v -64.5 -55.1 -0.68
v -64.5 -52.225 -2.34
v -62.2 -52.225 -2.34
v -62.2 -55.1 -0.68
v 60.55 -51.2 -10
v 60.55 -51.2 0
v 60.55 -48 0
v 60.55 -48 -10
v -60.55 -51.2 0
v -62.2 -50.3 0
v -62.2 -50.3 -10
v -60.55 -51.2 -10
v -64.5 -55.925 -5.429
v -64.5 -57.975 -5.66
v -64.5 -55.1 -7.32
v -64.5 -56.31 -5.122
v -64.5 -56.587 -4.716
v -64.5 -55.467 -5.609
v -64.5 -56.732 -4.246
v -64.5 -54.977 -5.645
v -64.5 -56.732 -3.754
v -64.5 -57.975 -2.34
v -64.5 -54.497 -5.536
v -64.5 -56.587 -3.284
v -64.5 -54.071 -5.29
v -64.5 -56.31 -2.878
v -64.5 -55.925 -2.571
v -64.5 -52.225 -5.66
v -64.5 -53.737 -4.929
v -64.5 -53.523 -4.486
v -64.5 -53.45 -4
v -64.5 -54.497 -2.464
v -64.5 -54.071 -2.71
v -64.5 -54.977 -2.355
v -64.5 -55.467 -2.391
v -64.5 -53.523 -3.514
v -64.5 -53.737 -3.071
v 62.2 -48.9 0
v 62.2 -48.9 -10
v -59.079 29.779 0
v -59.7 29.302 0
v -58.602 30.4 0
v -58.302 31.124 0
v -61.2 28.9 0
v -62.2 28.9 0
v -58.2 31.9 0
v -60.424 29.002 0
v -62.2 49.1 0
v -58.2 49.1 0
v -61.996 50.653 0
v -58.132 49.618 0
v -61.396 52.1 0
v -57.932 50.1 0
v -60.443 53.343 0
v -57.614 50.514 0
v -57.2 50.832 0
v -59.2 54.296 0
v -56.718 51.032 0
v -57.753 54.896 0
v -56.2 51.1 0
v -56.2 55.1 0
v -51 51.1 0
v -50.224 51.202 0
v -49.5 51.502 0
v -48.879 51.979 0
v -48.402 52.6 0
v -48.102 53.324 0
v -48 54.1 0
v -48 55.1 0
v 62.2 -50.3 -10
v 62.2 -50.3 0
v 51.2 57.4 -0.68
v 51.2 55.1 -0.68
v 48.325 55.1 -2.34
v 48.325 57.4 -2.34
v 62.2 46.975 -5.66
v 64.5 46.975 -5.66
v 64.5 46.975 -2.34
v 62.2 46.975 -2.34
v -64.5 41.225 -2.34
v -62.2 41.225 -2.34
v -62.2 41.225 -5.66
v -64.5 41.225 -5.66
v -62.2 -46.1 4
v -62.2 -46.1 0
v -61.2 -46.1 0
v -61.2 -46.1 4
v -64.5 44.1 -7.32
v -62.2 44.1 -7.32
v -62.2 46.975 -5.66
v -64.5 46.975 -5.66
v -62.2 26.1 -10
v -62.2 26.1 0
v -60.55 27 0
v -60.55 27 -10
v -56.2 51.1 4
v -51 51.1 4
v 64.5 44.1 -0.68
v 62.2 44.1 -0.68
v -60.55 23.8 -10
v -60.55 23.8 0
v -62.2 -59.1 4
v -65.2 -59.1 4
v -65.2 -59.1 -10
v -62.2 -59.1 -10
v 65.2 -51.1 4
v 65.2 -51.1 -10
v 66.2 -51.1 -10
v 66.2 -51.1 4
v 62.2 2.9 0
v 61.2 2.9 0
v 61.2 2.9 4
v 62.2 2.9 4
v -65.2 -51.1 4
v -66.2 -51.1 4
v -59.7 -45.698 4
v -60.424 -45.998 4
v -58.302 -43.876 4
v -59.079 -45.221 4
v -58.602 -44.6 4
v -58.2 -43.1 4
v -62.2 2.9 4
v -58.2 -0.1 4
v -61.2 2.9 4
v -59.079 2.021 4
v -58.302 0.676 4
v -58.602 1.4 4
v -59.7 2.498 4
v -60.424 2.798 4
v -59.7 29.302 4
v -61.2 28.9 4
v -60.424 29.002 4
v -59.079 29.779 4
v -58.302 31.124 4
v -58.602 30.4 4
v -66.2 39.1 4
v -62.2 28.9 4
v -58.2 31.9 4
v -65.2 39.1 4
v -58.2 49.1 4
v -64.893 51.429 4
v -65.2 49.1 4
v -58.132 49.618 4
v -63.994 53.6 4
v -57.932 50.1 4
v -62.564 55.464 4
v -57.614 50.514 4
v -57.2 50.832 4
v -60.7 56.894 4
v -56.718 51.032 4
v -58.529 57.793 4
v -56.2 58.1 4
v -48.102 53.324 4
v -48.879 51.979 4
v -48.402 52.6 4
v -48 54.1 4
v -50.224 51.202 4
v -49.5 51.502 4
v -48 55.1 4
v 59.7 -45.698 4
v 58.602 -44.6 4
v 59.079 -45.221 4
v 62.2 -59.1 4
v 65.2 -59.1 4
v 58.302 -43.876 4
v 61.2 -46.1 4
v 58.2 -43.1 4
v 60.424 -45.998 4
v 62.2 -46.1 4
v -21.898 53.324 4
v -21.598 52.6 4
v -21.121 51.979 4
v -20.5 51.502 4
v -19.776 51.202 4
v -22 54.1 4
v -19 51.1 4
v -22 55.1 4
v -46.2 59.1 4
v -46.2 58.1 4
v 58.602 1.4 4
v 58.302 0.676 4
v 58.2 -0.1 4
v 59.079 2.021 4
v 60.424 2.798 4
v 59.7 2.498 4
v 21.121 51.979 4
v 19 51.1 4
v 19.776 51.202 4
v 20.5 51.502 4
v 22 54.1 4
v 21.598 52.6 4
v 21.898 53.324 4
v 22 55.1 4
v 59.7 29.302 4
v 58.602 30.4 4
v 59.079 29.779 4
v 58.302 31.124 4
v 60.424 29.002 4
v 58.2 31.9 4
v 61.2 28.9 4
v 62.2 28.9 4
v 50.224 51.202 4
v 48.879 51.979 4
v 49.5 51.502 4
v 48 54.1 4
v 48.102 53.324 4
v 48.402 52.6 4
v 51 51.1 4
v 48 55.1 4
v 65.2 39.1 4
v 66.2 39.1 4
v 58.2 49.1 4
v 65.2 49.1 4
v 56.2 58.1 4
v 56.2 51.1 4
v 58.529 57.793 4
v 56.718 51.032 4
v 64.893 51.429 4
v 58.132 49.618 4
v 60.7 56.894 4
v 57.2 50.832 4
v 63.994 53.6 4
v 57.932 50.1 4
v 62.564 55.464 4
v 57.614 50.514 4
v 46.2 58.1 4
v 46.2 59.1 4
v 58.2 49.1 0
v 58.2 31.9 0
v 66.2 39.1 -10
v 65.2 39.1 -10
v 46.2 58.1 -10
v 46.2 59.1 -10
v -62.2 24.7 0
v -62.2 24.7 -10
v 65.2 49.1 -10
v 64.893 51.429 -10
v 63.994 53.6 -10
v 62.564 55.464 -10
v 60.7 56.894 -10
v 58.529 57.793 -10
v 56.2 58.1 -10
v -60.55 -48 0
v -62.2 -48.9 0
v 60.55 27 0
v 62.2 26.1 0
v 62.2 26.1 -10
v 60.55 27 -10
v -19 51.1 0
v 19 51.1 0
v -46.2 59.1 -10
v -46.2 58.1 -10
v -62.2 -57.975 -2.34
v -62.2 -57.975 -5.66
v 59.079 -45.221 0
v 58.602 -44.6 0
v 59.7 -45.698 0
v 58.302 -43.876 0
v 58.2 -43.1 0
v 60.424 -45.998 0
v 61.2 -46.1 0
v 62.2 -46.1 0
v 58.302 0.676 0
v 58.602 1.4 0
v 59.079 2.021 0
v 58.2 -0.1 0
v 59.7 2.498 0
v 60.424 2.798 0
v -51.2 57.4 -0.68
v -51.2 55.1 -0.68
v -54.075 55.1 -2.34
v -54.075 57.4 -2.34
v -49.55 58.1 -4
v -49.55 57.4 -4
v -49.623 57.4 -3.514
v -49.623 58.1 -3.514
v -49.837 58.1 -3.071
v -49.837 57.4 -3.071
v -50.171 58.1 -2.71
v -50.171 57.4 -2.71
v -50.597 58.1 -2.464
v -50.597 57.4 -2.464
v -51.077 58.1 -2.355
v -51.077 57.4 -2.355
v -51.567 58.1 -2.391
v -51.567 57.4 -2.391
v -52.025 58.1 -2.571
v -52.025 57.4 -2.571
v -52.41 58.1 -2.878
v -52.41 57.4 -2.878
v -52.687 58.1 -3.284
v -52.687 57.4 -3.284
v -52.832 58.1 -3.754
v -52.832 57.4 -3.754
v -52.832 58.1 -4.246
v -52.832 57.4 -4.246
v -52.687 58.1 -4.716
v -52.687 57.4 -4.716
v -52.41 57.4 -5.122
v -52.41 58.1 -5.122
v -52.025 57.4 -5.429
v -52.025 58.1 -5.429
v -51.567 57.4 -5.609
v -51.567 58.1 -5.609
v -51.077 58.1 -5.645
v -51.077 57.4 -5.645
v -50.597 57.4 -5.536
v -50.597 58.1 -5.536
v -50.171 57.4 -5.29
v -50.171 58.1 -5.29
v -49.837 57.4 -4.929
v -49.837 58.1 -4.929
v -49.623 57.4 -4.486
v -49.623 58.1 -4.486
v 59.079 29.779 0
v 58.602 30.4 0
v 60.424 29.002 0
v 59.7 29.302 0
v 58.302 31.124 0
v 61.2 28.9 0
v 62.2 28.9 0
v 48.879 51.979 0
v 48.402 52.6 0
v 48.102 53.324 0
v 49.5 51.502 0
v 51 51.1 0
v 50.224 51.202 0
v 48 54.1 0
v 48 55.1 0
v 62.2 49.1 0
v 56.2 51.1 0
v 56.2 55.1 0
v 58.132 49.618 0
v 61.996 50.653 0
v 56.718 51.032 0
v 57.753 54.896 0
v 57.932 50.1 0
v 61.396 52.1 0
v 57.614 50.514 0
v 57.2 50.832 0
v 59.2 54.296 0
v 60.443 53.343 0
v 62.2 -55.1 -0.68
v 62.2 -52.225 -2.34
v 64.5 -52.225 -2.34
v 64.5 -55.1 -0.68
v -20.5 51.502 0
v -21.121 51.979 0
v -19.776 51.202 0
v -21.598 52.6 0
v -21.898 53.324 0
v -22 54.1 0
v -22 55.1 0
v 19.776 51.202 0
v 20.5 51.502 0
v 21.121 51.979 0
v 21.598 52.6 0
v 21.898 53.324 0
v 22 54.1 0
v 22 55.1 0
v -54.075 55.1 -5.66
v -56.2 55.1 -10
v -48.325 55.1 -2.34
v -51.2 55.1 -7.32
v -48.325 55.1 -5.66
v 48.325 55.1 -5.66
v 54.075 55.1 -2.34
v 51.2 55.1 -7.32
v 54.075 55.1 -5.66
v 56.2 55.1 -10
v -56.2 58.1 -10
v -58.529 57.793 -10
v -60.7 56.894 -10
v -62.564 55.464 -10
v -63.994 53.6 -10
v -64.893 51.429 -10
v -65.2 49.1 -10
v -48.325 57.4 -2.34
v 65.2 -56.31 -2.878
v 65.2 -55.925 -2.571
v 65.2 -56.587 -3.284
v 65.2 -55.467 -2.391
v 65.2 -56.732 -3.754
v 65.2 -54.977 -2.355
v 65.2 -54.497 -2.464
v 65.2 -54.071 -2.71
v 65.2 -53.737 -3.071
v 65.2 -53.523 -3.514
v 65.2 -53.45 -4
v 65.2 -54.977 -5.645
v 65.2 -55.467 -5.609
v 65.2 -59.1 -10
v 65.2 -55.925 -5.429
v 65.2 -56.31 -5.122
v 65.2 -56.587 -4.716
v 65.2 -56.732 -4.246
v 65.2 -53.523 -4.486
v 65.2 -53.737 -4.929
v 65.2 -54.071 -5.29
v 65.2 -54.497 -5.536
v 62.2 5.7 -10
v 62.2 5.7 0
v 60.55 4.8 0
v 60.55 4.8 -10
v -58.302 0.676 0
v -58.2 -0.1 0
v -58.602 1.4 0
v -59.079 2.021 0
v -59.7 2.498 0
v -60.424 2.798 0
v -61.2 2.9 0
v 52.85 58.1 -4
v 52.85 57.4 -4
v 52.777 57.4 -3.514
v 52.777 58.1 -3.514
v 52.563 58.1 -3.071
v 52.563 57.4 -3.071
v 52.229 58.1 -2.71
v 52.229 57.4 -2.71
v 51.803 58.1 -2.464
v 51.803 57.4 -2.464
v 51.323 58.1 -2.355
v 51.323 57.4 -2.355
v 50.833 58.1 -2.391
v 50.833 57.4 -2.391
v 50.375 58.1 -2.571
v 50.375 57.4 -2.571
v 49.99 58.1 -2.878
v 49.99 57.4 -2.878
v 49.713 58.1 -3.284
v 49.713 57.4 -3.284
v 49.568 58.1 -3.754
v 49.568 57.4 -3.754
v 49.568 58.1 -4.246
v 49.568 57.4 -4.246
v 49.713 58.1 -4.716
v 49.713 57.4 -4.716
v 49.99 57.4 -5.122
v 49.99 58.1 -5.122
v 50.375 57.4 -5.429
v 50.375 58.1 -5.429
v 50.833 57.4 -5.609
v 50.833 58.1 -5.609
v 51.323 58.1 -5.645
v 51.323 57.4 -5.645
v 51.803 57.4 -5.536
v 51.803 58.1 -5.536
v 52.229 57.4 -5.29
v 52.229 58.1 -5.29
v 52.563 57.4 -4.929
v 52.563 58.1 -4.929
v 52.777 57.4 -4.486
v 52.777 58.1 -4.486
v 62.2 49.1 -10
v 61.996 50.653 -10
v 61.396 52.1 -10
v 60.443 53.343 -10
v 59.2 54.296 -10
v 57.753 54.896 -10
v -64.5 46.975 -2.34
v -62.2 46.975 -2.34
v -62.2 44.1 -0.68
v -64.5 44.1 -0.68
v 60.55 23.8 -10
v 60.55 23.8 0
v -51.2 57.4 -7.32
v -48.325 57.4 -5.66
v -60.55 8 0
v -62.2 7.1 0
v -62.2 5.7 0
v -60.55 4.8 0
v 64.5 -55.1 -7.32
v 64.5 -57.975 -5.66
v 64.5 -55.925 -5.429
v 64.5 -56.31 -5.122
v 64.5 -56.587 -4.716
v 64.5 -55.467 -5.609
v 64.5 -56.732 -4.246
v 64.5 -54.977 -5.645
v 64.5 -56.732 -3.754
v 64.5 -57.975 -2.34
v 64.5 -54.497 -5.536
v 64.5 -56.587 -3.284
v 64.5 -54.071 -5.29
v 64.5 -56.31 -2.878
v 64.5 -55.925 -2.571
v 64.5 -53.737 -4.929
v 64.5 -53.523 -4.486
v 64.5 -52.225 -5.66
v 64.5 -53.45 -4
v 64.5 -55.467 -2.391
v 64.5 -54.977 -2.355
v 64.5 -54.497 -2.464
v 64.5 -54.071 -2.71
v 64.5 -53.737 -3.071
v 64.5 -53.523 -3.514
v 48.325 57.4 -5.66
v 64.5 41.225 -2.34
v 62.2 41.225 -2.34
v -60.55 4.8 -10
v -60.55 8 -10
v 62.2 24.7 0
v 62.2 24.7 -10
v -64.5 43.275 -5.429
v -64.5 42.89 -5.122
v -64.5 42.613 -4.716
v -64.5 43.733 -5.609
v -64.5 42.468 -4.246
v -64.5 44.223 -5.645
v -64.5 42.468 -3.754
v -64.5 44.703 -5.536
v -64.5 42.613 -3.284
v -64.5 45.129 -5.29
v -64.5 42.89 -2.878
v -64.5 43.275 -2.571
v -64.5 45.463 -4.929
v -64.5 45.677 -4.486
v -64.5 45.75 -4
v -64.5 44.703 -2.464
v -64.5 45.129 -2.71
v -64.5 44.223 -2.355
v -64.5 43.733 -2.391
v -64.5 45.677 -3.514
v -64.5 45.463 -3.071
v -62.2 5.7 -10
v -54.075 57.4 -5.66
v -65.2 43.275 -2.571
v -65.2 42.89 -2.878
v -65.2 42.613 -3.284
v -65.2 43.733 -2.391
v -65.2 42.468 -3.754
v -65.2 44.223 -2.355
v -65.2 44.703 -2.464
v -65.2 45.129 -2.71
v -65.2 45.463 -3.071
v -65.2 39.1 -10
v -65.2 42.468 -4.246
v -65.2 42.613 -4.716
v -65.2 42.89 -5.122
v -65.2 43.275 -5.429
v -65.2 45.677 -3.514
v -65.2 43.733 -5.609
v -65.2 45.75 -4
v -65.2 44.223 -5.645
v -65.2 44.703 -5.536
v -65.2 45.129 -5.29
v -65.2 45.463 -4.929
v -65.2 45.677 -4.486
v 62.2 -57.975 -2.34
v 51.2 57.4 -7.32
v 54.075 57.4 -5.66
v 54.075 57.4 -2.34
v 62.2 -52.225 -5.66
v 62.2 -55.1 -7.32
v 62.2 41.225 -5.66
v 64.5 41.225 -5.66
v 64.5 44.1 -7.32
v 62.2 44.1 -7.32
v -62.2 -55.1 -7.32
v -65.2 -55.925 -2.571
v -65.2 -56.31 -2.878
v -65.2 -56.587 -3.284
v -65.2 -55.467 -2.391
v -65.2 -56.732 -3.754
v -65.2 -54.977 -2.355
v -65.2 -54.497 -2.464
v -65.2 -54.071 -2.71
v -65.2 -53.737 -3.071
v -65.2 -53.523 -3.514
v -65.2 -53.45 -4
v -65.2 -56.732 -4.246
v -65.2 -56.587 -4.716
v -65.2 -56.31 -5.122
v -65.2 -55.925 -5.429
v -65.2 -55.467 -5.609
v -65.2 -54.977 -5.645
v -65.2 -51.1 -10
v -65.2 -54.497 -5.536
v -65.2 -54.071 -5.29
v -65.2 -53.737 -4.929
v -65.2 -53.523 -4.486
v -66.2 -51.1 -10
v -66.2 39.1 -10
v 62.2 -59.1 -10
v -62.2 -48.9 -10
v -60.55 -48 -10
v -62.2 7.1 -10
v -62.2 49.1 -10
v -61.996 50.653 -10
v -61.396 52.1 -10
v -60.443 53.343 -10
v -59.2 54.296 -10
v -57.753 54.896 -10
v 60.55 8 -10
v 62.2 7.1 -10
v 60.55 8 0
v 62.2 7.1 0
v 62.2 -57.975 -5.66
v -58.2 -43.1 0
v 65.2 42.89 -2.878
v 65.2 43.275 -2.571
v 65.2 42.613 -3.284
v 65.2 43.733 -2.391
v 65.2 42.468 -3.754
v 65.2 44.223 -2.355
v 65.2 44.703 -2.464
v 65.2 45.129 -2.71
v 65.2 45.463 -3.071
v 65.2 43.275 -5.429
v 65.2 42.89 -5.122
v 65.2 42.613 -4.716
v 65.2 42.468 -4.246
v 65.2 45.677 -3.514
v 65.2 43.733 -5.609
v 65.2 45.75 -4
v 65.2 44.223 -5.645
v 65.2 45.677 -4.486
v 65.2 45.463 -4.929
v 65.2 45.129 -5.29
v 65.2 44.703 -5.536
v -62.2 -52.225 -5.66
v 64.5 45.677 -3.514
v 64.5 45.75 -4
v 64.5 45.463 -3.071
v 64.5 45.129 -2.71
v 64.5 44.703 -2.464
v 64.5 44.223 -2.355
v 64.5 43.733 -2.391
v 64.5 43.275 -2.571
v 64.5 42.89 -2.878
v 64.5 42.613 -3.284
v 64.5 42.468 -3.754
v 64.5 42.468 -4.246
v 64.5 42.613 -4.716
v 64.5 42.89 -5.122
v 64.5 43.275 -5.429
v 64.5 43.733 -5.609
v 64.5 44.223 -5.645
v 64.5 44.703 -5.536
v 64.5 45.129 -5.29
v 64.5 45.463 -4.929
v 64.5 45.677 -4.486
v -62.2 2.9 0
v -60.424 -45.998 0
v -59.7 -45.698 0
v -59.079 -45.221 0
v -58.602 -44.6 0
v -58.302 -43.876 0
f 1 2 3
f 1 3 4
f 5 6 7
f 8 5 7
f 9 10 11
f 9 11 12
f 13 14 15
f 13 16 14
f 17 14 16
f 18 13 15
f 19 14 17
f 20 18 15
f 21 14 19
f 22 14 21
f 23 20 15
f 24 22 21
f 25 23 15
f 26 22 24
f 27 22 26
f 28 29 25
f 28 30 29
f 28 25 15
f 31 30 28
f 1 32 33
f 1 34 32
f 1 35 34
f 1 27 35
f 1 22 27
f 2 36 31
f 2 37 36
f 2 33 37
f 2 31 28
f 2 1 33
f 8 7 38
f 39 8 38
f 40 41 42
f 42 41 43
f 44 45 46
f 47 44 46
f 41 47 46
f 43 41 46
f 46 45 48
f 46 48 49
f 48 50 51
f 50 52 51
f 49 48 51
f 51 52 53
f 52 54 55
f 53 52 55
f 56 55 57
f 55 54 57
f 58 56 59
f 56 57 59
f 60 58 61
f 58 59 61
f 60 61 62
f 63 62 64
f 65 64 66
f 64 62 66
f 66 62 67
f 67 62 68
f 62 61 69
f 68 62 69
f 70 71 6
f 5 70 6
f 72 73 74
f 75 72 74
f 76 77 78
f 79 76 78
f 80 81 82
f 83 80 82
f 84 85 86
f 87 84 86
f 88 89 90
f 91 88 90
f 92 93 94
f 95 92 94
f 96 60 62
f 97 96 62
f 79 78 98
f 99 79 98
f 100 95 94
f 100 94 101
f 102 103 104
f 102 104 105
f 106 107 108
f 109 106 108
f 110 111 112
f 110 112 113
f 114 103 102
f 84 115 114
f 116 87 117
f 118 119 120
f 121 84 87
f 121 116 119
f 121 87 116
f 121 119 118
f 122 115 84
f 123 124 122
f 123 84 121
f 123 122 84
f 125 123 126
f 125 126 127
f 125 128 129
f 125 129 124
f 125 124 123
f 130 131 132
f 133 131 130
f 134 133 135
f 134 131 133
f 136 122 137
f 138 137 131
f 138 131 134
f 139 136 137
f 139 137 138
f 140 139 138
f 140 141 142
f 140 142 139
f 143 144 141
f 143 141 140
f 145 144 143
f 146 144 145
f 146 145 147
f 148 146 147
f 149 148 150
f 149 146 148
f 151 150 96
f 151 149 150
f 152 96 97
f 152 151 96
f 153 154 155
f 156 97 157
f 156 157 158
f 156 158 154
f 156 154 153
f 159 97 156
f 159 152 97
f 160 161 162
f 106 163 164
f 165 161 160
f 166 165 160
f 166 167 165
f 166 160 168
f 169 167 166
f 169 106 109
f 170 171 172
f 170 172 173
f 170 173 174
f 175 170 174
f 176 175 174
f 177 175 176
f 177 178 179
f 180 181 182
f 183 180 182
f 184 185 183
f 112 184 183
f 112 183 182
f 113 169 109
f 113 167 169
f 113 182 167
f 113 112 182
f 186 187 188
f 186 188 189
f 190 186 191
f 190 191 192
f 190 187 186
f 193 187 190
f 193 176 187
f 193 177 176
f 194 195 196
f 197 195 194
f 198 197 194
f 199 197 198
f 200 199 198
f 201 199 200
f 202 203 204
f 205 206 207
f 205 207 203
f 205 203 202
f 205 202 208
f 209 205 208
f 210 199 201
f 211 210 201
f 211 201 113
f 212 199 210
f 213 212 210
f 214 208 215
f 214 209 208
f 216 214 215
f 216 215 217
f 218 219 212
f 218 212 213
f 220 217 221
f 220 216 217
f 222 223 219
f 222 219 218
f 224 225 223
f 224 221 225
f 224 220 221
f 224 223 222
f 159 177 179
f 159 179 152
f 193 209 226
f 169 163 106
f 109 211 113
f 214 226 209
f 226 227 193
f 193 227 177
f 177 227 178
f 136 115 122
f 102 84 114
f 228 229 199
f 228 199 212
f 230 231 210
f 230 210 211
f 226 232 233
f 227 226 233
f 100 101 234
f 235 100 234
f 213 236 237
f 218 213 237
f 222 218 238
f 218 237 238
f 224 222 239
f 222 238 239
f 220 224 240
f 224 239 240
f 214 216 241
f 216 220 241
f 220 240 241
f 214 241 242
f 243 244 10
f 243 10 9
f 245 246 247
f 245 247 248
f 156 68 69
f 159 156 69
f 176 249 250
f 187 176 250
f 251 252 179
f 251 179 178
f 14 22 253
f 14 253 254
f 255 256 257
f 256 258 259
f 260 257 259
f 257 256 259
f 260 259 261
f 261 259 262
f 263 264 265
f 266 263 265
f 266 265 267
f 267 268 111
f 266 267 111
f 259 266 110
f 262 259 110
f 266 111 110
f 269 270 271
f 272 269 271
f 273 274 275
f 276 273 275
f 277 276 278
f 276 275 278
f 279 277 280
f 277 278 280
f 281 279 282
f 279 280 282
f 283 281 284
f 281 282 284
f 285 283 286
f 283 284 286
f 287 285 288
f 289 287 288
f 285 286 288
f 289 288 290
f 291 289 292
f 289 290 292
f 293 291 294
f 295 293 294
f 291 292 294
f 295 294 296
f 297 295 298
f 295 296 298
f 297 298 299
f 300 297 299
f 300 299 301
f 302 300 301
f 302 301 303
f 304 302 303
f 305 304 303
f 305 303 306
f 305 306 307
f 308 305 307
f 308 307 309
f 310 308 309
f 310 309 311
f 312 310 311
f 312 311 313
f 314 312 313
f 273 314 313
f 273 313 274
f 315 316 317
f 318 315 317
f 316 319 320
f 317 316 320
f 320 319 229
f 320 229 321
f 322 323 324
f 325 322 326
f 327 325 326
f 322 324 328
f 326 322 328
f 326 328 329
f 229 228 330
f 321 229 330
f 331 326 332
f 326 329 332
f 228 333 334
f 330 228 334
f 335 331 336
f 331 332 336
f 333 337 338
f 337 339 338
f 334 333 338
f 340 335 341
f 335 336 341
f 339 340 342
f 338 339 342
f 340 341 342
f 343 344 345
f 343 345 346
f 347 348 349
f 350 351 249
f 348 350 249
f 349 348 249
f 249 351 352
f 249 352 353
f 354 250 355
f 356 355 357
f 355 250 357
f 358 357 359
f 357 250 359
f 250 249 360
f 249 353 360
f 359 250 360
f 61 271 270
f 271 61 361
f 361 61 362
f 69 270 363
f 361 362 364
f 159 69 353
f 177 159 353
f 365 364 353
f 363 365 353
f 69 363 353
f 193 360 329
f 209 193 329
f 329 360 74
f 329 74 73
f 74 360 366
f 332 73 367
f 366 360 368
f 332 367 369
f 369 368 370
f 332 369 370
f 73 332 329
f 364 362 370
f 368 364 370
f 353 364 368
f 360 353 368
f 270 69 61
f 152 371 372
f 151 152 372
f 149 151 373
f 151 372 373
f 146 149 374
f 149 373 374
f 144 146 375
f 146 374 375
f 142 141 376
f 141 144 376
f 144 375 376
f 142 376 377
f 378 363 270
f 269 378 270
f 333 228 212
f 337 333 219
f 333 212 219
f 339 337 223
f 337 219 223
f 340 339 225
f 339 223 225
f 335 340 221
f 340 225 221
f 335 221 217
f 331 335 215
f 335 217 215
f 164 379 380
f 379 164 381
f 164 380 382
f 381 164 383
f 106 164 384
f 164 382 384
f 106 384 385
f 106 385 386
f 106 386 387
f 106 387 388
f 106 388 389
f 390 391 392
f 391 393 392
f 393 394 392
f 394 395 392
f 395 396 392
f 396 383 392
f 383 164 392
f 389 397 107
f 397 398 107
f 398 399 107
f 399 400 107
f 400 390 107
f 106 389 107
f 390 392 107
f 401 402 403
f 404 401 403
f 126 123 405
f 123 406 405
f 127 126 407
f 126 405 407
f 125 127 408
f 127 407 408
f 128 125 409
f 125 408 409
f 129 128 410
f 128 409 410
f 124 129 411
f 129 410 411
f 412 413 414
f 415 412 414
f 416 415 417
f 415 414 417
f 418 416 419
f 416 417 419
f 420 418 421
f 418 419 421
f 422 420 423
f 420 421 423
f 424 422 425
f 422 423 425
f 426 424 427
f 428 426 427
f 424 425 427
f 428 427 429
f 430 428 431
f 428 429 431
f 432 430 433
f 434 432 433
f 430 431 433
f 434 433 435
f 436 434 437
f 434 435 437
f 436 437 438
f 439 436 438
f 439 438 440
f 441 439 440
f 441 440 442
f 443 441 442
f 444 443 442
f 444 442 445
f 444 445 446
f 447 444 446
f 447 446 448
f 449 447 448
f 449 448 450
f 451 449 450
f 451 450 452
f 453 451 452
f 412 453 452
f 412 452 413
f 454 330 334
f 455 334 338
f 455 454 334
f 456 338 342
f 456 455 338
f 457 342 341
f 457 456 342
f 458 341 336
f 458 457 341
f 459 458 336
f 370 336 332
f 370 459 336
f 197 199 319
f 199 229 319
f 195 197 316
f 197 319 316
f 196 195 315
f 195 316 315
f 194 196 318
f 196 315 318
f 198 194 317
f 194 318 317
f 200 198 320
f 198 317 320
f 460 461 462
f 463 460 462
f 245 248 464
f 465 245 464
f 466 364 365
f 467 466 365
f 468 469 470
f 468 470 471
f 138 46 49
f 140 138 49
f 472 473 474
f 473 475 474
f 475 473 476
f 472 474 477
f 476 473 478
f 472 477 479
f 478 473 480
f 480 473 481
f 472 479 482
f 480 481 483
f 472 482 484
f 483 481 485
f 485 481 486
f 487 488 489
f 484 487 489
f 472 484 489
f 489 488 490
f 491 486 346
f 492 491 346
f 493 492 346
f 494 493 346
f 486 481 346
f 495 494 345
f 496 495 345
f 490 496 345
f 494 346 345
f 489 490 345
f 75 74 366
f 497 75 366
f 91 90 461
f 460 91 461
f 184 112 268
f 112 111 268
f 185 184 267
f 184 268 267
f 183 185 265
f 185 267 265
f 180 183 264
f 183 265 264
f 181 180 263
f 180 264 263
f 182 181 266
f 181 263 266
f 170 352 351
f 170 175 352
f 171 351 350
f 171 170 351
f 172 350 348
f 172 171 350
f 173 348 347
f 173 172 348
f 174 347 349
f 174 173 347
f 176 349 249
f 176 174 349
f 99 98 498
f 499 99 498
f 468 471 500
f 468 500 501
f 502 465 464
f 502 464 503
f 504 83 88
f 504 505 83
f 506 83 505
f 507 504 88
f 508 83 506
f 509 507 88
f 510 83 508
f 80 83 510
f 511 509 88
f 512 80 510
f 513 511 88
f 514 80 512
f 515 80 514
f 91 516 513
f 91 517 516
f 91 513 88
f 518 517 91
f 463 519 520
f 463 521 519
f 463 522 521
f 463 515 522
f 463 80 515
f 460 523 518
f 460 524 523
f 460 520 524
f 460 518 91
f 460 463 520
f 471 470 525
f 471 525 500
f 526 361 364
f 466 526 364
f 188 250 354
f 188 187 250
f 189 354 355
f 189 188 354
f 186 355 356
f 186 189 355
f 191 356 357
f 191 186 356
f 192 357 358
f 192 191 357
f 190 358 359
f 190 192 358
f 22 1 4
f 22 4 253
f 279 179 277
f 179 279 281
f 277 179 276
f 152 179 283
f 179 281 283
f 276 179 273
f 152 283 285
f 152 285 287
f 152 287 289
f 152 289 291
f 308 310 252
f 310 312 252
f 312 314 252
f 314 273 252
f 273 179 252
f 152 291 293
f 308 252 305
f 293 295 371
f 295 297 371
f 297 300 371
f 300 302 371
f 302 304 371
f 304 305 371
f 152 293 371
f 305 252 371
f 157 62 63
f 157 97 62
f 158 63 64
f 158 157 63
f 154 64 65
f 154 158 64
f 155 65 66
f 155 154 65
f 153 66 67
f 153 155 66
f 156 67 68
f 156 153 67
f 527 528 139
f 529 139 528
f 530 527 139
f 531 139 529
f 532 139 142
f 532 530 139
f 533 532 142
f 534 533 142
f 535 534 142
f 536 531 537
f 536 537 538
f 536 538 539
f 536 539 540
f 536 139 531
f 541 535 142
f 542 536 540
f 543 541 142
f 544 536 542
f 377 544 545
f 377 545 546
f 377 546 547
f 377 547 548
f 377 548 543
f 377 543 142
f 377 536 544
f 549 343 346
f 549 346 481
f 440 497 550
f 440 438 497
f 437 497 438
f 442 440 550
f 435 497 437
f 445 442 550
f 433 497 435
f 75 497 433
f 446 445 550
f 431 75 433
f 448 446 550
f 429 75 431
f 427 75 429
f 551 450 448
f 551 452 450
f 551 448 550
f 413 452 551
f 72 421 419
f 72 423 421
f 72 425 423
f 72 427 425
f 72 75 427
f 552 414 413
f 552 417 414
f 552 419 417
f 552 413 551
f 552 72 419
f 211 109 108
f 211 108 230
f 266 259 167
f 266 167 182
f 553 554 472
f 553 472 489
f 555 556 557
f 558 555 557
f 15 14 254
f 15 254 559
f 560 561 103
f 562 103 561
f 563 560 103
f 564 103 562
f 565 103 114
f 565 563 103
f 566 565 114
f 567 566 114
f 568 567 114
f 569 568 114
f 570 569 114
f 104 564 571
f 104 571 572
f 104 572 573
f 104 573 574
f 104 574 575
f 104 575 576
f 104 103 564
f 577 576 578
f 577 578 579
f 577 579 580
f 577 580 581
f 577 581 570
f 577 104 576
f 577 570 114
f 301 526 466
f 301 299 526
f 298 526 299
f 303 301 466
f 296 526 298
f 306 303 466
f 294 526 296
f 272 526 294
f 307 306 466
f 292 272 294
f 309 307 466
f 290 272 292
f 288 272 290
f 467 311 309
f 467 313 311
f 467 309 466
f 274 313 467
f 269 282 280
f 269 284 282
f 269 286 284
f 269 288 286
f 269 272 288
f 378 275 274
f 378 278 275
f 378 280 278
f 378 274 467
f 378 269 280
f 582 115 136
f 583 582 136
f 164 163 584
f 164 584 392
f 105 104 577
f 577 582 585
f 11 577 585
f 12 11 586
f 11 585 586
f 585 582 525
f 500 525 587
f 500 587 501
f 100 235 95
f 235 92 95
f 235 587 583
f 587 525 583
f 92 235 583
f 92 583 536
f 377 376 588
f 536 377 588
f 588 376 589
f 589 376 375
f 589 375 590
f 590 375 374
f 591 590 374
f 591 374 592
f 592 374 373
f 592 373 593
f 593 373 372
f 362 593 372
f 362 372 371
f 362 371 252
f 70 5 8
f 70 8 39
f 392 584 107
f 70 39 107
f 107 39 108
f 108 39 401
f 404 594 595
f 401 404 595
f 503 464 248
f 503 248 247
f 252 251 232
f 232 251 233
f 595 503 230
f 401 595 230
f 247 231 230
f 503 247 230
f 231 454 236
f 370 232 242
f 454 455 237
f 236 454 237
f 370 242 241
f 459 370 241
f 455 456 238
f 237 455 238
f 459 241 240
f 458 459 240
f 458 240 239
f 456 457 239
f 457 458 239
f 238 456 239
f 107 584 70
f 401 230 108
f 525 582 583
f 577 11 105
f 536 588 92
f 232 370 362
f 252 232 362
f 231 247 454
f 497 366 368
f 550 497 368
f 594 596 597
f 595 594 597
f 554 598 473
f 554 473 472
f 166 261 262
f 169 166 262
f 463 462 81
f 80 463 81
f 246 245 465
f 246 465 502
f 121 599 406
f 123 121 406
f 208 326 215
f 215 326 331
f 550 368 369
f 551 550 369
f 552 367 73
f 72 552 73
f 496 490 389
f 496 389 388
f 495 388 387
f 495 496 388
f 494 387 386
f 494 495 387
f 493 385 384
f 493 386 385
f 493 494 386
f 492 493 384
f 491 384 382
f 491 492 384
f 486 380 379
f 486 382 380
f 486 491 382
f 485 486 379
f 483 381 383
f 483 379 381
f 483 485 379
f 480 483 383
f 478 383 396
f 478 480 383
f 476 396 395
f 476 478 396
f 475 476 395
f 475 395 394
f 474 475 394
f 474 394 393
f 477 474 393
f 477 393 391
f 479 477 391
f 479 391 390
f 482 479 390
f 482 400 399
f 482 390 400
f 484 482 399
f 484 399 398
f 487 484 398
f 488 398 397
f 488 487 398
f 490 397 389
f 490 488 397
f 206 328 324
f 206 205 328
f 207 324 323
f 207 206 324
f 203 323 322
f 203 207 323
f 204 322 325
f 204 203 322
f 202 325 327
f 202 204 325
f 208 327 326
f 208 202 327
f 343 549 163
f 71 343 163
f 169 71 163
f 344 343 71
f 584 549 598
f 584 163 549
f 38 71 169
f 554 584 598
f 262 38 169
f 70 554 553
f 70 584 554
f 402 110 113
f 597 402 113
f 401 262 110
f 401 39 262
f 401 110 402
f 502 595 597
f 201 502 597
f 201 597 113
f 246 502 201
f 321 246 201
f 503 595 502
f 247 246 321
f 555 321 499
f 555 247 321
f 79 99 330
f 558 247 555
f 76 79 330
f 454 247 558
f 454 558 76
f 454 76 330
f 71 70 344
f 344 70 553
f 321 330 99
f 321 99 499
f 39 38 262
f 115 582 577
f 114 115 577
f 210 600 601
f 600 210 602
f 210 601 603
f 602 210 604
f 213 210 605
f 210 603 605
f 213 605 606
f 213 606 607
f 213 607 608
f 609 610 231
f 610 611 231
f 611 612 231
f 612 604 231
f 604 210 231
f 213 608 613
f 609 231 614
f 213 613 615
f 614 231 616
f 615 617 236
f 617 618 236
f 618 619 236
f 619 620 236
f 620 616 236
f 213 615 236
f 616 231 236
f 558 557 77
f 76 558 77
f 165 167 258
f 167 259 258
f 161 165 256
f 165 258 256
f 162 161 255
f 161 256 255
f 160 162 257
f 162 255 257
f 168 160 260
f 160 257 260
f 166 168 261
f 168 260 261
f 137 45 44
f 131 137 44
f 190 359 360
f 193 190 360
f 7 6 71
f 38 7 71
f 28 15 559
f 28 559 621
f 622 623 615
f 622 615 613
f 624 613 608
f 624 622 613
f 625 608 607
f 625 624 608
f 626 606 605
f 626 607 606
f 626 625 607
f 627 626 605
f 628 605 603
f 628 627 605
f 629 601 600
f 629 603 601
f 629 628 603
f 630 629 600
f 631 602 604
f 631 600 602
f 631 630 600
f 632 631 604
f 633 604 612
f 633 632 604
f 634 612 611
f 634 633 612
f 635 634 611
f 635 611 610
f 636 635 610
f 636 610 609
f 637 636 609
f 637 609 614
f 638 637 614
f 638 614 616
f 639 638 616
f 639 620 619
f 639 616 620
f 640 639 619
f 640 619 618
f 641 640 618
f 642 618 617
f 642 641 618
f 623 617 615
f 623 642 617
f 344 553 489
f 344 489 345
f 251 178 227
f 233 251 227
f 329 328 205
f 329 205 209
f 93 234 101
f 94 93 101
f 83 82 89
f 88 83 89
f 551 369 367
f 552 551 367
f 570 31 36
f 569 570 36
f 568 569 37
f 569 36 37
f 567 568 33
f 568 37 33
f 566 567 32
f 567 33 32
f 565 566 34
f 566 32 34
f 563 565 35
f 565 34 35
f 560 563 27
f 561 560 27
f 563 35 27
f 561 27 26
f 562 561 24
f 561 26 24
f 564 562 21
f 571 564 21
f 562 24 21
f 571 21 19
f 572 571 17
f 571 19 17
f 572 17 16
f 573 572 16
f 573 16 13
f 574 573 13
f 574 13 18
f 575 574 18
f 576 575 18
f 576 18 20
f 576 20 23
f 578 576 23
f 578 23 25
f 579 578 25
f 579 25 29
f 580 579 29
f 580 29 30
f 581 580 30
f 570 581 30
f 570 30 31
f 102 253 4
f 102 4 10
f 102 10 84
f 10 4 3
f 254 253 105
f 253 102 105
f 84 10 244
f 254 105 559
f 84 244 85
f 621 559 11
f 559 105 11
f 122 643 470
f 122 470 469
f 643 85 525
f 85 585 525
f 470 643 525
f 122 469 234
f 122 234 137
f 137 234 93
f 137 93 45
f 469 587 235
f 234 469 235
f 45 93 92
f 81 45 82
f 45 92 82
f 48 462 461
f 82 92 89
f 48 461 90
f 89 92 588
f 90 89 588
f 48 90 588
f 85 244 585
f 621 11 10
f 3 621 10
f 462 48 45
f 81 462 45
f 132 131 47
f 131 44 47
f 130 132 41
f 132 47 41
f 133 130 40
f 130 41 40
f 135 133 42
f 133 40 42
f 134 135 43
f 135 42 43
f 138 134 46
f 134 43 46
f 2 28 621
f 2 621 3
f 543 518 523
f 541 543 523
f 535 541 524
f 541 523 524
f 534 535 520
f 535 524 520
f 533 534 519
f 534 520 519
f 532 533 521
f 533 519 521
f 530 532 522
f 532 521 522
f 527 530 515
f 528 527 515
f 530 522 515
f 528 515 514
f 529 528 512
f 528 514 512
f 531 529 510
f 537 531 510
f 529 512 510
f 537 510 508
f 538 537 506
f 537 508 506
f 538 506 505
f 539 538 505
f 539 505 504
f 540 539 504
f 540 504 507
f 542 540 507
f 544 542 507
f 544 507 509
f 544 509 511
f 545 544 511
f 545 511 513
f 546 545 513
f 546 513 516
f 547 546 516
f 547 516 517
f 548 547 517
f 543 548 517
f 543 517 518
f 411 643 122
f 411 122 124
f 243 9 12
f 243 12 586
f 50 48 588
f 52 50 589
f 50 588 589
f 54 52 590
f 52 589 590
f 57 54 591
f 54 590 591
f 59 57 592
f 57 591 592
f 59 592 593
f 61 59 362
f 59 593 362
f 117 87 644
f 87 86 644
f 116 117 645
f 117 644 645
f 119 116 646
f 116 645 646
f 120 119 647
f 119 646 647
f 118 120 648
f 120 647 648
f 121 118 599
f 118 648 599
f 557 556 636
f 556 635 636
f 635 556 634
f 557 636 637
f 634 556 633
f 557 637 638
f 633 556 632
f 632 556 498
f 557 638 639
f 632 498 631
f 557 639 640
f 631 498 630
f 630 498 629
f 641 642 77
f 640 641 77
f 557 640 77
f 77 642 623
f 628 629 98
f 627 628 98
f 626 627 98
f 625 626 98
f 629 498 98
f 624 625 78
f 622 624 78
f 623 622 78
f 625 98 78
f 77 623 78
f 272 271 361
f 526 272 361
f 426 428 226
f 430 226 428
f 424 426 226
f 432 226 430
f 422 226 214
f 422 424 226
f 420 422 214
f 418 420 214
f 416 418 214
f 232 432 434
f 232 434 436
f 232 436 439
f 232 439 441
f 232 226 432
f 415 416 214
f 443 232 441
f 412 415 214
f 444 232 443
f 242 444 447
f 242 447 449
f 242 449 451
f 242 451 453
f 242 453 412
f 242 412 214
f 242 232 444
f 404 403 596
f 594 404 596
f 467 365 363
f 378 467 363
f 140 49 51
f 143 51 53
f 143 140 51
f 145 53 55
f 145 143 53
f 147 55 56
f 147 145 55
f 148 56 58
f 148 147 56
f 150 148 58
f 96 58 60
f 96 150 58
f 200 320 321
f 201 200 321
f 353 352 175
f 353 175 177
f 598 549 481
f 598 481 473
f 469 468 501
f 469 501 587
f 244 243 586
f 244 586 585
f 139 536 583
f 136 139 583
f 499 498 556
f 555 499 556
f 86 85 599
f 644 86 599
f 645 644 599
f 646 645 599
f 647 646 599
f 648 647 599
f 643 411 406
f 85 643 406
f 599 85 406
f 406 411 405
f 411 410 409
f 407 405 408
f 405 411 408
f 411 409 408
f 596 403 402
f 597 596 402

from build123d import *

# Parameters (mm, degrees)
SKETCH_W             = 132.4
SKETCH_H             = 118.2
PAD_DEPTH            = 4
PAD_DEPTH_BACK       = 10
SKETCH001_W          = 124.4
SKETCH001_H          = 114.2
POCKET_DEPTH         = 10.001
SKETCH002_W          = 116.4
SKETCH002_H          = 110.2
POCKET001_DEPTH      = 5
FILLET_R             = 6
FILLET001_R          = 10
FILLET002_R          = 2
POCKET002_DEPTH      = 10.001
POCKET002_DEPTH_BACK = 4.001
PAD001_DEPTH         = 10
SKETCH005_W          = 1
SKETCH005_H          = 8
POCKET003_DEPTH      = 10.001
POCKET003_DEPTH_BACK = 4.001
SKETCH006_R          = 1.65
POCKET004_DEPTH      = 66.201
POCKET004_DEPTH_BACK = 66.201
POCKET005_DEPTH      = 64.5
SKETCH008_R          = 1.65
POCKET006_DEPTH      = 59.101
POCKET006_DEPTH_BACK = 59.101
POCKET007_DEPTH      = 57.4
SKETCH010_W          = 124.4
SKETCH010_H          = 13
SKETCH010_H_2        = 26
SKETCH010_W_2        = 26
SKETCH010_H_3        = 4
POCKET008_DEPTH      = 4.001
FILLET003_R          = 3


with BuildPart() as part:
    # Sketch → Pad (new body, two sides)
    with BuildSketch(Plane.XY) as pad_sk:
        Rectangle(SKETCH_W, SKETCH_H)
    extrude(amount=PAD_DEPTH)
    extrude(pad_sk.sketch, amount=-PAD_DEPTH_BACK)

    # Sketch001 → Pocket (cut, through all)
    with BuildSketch(Plane.XY):
        with Locations((0, -2)):
            Rectangle(SKETCH001_W, SKETCH001_H)
    extrude(amount=-POCKET_DEPTH, mode=Mode.SUBTRACT)

    # Sketch002 → Pocket001 (cut)
    with BuildSketch(Plane.XY):
        with Locations((0, -4)):
            Rectangle(SKETCH002_W, SKETCH002_H)
    extrude(amount=POCKET001_DEPTH, mode=Mode.SUBTRACT)

    # Fillet
    fillet_edges = [part.edges().sort_by_distance(p)[0] for p in [
        (-62.2, 55.1, -5),
        (62.2, 55.1, -5),
    ]]
    fillet(fillet_edges, radius=FILLET_R)

    # Fillet001
    fillet001_edges = [part.edges().sort_by_distance(p)[0] for p in [
        (-66.2, 59.1, -3),
        (66.2, 59.1, -3),
    ]]
    fillet(fillet001_edges, radius=FILLET001_R)

    # Fillet002
    fillet002_edges = [part.edges().sort_by_distance(p)[0] for p in [
        (-58.2, 51.1, 2),
        (58.2, 51.1, 2),
    ]]
    fillet(fillet002_edges, radius=FILLET002_R)

    # Sketch003 → Pocket002 (cut, two sides)
    with BuildSketch(Plane.XY) as pocket002_sk:
        with BuildLine():
            Line((-65.2, 39.1), (-65.2, 49.1))
            ThreePointArc((-56.2, 58.1), (-62.563961, 55.463961), (-65.2, 49.1))
            Line((-46.2, 58.1), (-56.2, 58.1))
            Line((-46.2, 58.1), (-46.2, 59.1))
            Line((-46.2, 59.1), (-56.2, 59.1))
            ThreePointArc((-56.2, 59.1), (-63.271068, 56.171068), (-66.2, 49.1))
            Line((-66.2, 39.1), (-66.2, 49.1))
            Line((-65.2, 39.1), (-66.2, 39.1))
        make_face()
        with BuildLine():
            Line((65.2, 39.1), (65.2, 49.1))
            ThreePointArc((65.2, 49.1), (62.563961, 55.463961), (56.2, 58.1))
            Line((46.2, 58.1), (56.2, 58.1))
            Line((46.2, 58.1), (46.2, 59.1))
            Line((46.2, 59.1), (56.2, 59.1))
            ThreePointArc((66.2, 49.1), (63.271068, 56.171068), (56.2, 59.1))
            Line((66.2, 39.1), (66.2, 49.1))
            Line((65.2, 39.1), (66.2, 39.1))
        make_face()
    extrude(amount=-POCKET002_DEPTH, mode=Mode.SUBTRACT)
    extrude(pocket002_sk.sketch, amount=POCKET002_DEPTH_BACK, mode=Mode.SUBTRACT)

    # Sketch004 → Pad001 (join)
    with BuildSketch(Plane.XY):
        Polygon((-62.2, 24.7), (-62.2, 26.1), (-60.55, 27), (-60.55, 23.8), align=None)
        Polygon((-62.2, 5.7), (-60.55, 4.8), (-60.55, 8), (-62.2, 7.1), align=None)
        Polygon((-62.2, -50.3), (-60.55, -51.2), (-60.55, -48), (-62.2, -48.9), align=None)
        Polygon((62.2, 24.7), (62.2, 26.1), (60.55, 27), (60.55, 23.8), align=None)
        Polygon((62.2, 5.7), (60.55, 4.8), (60.55, 8), (62.2, 7.1), align=None)
        Polygon((62.2, -50.3), (60.55, -51.2), (60.55, -48), (62.2, -48.9), align=None)
    extrude(amount=-PAD001_DEPTH)

    # Sketch005 → Pocket003 (cut, two sides)
    with BuildSketch(Plane.XY) as pocket003_sk:
        with Locations((-65.7, -55.1)):
            Rectangle(SKETCH005_W, SKETCH005_H)
        with Locations((65.7, -55.1)):
            Rectangle(SKETCH005_W, SKETCH005_H)
    extrude(amount=-POCKET003_DEPTH, mode=Mode.SUBTRACT)
    extrude(pocket003_sk.sketch, amount=POCKET003_DEPTH_BACK, mode=Mode.SUBTRACT)

    # Sketch006 → Pocket004 (cut, two sides)
    with BuildSketch(Plane.YZ) as pocket004_sk:
        with Locations((-55.1, -4)):
            Circle(SKETCH006_R)
        with Locations((44.1, -4)):
            Circle(SKETCH006_R)
    extrude(amount=-POCKET004_DEPTH, mode=Mode.SUBTRACT)
    extrude(pocket004_sk.sketch, amount=POCKET004_DEPTH_BACK, mode=Mode.SUBTRACT)

    # Sketch007 → Pocket005 (cut, symmetric)
    with BuildSketch(Plane.YZ):
        Polygon((-57.975, -5.659882), (-55.1, -7.319764), (-52.225, -5.659882), (-52.225, -2.340118), (-55.1, -0.680236), (-57.975, -2.340118), align=None)
        Polygon((44.1, -7.319764), (46.975, -5.659882), (46.975, -2.340118), (44.1, -0.680236), (41.225, -2.340118), (41.225, -5.659882), align=None)
    extrude(amount=POCKET005_DEPTH, both=True, mode=Mode.SUBTRACT)

    # Sketch008 → Pocket006 (cut, two sides)
    with BuildSketch(Plane.XZ) as pocket006_sk:
        with Locations((-51.2, -4)):
            Circle(SKETCH008_R)
        with Locations((51.2, -4)):
            Circle(SKETCH008_R)
    extrude(amount=-POCKET006_DEPTH, mode=Mode.SUBTRACT)
    extrude(pocket006_sk.sketch, amount=POCKET006_DEPTH_BACK, mode=Mode.SUBTRACT)

    # Sketch009 → Pocket007 (cut)
    with BuildSketch(Plane.XZ):
        Polygon((-51.2, -7.319764), (-48.325, -5.659882), (-48.325, -2.340118), (-51.2, -0.680236), (-54.075, -2.340118), (-54.075, -5.659882), align=None)
        Polygon((51.2, -7.319764), (54.075, -5.659882), (54.075, -2.340118), (51.2, -0.680236), (48.325, -2.340118), (48.325, -5.659882), align=None)
    extrude(amount=-POCKET007_DEPTH, mode=Mode.SUBTRACT)

    # Sketch010 → Pocket008 (cut, through all)
    with BuildSketch(Plane.XY):
        with Locations((0, -52.6)):
            Rectangle(SKETCH010_W, SKETCH010_H)
        with Locations((0, 15.9)):
            Rectangle(SKETCH010_W, SKETCH010_H_2)
        with Locations((-35, 53.1)):
            Rectangle(SKETCH010_W_2, SKETCH010_H_3)
        with Locations((35, 53.1)):
            Rectangle(SKETCH010_W_2, SKETCH010_H_3)
    extrude(amount=POCKET008_DEPTH, mode=Mode.SUBTRACT)

    # Fillet003
    fillet003_edges = [part.edges().sort_by_distance(p)[0] for p in [
        (-58.2, -46.1, 2),
        (-58.2, 2.9, 2),
        (-58.2, 28.9, 2),
        (-48, 51.1, 2),
        (-22, 51.1, 2),
        (22, 51.1, 2),
        (48, 51.1, 2),
        (58.2, 28.9, 2),
        (58.2, 2.9, 2),
        (58.2, -46.1, 2),
    ]]
    fillet(fillet003_edges, radius=FILLET003_R)


solid = part.part
